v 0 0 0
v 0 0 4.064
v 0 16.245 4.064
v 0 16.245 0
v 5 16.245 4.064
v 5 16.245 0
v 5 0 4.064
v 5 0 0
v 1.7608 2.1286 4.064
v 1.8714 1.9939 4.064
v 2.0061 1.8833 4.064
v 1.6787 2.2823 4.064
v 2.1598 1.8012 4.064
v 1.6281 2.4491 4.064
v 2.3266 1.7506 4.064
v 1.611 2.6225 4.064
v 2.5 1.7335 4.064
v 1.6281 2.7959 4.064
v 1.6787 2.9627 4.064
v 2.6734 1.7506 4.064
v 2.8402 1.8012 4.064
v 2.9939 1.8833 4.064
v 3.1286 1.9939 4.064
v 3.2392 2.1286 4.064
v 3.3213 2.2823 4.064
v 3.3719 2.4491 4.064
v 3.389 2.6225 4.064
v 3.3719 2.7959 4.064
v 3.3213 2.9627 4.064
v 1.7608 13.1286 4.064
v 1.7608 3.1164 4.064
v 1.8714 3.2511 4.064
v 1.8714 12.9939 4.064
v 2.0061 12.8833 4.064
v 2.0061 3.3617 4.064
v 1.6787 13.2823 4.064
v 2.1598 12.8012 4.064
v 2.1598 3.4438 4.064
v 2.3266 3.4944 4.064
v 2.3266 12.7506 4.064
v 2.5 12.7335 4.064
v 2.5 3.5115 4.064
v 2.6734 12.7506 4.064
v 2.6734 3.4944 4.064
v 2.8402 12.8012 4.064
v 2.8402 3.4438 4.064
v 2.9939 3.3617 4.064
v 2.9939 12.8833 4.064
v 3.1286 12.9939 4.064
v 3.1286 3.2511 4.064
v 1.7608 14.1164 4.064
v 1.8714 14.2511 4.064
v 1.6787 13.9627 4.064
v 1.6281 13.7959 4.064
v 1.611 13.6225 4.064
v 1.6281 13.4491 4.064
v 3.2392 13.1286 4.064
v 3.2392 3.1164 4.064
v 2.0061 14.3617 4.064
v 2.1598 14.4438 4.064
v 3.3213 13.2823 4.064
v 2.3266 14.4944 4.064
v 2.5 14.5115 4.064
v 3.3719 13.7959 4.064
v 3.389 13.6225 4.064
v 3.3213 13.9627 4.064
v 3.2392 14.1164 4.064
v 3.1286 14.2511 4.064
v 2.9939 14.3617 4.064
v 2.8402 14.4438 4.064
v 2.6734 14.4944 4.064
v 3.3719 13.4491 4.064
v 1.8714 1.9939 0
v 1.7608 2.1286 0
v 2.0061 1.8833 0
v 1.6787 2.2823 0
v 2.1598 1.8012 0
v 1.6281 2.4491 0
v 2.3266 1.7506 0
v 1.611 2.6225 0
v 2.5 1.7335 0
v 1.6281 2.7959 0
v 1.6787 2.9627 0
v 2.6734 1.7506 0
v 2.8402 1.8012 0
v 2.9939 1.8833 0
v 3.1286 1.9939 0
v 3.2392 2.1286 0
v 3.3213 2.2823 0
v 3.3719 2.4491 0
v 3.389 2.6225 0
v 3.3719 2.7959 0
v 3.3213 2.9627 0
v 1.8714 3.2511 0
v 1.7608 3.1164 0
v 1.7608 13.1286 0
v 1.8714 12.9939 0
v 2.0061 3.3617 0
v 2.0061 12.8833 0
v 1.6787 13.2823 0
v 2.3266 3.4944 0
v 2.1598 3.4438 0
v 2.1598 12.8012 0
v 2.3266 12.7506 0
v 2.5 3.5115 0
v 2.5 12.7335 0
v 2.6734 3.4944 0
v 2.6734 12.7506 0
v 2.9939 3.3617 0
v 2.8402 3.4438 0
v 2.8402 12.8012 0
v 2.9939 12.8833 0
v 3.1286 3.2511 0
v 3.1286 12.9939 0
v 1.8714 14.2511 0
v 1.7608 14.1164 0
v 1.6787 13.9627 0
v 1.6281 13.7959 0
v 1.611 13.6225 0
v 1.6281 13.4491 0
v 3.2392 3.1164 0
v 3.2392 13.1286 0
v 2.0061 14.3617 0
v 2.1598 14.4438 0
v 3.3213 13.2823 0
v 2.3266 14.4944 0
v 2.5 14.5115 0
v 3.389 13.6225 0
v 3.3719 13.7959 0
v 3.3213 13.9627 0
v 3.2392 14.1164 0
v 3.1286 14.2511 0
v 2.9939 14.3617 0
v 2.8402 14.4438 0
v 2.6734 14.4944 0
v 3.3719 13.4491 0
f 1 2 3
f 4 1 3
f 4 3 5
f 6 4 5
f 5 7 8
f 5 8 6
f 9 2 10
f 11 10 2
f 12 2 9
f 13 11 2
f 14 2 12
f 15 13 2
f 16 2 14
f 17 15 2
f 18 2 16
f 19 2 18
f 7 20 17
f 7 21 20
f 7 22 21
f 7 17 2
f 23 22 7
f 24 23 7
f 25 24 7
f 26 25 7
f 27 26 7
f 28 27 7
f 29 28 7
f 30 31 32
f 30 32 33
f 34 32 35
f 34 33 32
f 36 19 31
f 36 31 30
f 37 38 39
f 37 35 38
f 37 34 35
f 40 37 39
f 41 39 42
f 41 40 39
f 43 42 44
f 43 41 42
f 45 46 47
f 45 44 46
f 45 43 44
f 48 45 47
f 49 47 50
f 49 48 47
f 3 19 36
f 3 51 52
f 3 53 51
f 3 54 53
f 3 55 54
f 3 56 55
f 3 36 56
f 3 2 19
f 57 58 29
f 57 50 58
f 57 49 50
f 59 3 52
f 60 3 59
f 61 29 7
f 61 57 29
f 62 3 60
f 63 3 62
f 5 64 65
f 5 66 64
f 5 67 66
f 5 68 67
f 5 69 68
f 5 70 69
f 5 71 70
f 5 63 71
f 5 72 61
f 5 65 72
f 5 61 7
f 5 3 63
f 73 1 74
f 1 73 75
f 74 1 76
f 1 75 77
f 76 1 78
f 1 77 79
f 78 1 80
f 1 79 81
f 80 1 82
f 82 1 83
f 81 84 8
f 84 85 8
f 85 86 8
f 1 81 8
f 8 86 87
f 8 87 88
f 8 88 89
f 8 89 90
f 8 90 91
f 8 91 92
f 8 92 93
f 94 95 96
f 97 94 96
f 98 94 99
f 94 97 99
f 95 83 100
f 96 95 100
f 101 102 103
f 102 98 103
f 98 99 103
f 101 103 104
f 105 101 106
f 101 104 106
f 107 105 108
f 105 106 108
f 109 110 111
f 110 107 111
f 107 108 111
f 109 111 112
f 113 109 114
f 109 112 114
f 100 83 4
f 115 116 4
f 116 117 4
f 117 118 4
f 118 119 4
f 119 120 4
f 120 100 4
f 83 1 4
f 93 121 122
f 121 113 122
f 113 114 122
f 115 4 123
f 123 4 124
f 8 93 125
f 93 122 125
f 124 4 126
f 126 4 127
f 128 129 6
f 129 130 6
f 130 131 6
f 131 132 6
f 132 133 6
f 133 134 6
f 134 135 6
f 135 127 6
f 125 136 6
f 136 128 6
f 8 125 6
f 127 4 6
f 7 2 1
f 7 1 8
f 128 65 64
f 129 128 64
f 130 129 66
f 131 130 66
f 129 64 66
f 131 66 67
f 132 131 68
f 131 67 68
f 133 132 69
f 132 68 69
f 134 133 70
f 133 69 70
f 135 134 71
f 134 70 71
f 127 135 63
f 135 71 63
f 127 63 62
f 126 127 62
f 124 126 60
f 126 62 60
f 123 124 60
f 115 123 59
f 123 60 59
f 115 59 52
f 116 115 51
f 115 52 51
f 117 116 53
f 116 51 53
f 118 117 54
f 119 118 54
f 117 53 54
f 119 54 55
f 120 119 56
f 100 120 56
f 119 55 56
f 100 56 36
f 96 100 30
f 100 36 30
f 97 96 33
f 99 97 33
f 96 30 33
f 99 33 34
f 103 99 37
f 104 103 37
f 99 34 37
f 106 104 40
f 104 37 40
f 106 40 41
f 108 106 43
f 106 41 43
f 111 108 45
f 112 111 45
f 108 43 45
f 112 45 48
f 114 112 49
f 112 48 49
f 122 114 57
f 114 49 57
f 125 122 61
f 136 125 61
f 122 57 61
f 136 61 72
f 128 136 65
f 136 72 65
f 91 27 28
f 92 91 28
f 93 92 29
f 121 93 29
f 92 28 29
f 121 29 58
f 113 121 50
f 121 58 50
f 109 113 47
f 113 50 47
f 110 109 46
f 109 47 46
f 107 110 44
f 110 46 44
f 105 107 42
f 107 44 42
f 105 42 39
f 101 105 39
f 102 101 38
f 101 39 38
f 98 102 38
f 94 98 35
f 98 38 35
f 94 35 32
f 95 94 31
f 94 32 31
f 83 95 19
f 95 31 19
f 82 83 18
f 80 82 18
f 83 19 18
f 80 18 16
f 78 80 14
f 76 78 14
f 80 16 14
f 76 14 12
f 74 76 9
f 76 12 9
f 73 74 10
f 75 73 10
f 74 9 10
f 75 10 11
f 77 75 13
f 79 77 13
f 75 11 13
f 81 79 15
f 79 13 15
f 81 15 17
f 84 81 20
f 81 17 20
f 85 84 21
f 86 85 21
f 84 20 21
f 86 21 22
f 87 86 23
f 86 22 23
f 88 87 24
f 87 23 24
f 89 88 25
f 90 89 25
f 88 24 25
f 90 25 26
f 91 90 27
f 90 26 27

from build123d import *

# Parameters (mm, degrees)
ESBO_O1_W                = 5
ESBO_O1_H                = 16.245
ESBO_O1_R                = 0.889
RESSALTO_EXTRUS_O1_DEPTH = 4.064


with BuildPart() as part:
    # Esboço1 → Ressalto-extrusão1 (new body)
    with BuildSketch(Plane.XY.offset(4.064)):
        with Locations((2.5, 8.1225)):
            Rectangle(ESBO_O1_W, ESBO_O1_H)
        with Locations((2.5, 2.6225)):
            Circle(ESBO_O1_R, mode=Mode.SUBTRACT)
        with Locations((2.5, 13.6225)):
            Circle(ESBO_O1_R, mode=Mode.SUBTRACT)
    extrude(amount=-RESSALTO_EXTRUS_O1_DEPTH)


solid = part.part
